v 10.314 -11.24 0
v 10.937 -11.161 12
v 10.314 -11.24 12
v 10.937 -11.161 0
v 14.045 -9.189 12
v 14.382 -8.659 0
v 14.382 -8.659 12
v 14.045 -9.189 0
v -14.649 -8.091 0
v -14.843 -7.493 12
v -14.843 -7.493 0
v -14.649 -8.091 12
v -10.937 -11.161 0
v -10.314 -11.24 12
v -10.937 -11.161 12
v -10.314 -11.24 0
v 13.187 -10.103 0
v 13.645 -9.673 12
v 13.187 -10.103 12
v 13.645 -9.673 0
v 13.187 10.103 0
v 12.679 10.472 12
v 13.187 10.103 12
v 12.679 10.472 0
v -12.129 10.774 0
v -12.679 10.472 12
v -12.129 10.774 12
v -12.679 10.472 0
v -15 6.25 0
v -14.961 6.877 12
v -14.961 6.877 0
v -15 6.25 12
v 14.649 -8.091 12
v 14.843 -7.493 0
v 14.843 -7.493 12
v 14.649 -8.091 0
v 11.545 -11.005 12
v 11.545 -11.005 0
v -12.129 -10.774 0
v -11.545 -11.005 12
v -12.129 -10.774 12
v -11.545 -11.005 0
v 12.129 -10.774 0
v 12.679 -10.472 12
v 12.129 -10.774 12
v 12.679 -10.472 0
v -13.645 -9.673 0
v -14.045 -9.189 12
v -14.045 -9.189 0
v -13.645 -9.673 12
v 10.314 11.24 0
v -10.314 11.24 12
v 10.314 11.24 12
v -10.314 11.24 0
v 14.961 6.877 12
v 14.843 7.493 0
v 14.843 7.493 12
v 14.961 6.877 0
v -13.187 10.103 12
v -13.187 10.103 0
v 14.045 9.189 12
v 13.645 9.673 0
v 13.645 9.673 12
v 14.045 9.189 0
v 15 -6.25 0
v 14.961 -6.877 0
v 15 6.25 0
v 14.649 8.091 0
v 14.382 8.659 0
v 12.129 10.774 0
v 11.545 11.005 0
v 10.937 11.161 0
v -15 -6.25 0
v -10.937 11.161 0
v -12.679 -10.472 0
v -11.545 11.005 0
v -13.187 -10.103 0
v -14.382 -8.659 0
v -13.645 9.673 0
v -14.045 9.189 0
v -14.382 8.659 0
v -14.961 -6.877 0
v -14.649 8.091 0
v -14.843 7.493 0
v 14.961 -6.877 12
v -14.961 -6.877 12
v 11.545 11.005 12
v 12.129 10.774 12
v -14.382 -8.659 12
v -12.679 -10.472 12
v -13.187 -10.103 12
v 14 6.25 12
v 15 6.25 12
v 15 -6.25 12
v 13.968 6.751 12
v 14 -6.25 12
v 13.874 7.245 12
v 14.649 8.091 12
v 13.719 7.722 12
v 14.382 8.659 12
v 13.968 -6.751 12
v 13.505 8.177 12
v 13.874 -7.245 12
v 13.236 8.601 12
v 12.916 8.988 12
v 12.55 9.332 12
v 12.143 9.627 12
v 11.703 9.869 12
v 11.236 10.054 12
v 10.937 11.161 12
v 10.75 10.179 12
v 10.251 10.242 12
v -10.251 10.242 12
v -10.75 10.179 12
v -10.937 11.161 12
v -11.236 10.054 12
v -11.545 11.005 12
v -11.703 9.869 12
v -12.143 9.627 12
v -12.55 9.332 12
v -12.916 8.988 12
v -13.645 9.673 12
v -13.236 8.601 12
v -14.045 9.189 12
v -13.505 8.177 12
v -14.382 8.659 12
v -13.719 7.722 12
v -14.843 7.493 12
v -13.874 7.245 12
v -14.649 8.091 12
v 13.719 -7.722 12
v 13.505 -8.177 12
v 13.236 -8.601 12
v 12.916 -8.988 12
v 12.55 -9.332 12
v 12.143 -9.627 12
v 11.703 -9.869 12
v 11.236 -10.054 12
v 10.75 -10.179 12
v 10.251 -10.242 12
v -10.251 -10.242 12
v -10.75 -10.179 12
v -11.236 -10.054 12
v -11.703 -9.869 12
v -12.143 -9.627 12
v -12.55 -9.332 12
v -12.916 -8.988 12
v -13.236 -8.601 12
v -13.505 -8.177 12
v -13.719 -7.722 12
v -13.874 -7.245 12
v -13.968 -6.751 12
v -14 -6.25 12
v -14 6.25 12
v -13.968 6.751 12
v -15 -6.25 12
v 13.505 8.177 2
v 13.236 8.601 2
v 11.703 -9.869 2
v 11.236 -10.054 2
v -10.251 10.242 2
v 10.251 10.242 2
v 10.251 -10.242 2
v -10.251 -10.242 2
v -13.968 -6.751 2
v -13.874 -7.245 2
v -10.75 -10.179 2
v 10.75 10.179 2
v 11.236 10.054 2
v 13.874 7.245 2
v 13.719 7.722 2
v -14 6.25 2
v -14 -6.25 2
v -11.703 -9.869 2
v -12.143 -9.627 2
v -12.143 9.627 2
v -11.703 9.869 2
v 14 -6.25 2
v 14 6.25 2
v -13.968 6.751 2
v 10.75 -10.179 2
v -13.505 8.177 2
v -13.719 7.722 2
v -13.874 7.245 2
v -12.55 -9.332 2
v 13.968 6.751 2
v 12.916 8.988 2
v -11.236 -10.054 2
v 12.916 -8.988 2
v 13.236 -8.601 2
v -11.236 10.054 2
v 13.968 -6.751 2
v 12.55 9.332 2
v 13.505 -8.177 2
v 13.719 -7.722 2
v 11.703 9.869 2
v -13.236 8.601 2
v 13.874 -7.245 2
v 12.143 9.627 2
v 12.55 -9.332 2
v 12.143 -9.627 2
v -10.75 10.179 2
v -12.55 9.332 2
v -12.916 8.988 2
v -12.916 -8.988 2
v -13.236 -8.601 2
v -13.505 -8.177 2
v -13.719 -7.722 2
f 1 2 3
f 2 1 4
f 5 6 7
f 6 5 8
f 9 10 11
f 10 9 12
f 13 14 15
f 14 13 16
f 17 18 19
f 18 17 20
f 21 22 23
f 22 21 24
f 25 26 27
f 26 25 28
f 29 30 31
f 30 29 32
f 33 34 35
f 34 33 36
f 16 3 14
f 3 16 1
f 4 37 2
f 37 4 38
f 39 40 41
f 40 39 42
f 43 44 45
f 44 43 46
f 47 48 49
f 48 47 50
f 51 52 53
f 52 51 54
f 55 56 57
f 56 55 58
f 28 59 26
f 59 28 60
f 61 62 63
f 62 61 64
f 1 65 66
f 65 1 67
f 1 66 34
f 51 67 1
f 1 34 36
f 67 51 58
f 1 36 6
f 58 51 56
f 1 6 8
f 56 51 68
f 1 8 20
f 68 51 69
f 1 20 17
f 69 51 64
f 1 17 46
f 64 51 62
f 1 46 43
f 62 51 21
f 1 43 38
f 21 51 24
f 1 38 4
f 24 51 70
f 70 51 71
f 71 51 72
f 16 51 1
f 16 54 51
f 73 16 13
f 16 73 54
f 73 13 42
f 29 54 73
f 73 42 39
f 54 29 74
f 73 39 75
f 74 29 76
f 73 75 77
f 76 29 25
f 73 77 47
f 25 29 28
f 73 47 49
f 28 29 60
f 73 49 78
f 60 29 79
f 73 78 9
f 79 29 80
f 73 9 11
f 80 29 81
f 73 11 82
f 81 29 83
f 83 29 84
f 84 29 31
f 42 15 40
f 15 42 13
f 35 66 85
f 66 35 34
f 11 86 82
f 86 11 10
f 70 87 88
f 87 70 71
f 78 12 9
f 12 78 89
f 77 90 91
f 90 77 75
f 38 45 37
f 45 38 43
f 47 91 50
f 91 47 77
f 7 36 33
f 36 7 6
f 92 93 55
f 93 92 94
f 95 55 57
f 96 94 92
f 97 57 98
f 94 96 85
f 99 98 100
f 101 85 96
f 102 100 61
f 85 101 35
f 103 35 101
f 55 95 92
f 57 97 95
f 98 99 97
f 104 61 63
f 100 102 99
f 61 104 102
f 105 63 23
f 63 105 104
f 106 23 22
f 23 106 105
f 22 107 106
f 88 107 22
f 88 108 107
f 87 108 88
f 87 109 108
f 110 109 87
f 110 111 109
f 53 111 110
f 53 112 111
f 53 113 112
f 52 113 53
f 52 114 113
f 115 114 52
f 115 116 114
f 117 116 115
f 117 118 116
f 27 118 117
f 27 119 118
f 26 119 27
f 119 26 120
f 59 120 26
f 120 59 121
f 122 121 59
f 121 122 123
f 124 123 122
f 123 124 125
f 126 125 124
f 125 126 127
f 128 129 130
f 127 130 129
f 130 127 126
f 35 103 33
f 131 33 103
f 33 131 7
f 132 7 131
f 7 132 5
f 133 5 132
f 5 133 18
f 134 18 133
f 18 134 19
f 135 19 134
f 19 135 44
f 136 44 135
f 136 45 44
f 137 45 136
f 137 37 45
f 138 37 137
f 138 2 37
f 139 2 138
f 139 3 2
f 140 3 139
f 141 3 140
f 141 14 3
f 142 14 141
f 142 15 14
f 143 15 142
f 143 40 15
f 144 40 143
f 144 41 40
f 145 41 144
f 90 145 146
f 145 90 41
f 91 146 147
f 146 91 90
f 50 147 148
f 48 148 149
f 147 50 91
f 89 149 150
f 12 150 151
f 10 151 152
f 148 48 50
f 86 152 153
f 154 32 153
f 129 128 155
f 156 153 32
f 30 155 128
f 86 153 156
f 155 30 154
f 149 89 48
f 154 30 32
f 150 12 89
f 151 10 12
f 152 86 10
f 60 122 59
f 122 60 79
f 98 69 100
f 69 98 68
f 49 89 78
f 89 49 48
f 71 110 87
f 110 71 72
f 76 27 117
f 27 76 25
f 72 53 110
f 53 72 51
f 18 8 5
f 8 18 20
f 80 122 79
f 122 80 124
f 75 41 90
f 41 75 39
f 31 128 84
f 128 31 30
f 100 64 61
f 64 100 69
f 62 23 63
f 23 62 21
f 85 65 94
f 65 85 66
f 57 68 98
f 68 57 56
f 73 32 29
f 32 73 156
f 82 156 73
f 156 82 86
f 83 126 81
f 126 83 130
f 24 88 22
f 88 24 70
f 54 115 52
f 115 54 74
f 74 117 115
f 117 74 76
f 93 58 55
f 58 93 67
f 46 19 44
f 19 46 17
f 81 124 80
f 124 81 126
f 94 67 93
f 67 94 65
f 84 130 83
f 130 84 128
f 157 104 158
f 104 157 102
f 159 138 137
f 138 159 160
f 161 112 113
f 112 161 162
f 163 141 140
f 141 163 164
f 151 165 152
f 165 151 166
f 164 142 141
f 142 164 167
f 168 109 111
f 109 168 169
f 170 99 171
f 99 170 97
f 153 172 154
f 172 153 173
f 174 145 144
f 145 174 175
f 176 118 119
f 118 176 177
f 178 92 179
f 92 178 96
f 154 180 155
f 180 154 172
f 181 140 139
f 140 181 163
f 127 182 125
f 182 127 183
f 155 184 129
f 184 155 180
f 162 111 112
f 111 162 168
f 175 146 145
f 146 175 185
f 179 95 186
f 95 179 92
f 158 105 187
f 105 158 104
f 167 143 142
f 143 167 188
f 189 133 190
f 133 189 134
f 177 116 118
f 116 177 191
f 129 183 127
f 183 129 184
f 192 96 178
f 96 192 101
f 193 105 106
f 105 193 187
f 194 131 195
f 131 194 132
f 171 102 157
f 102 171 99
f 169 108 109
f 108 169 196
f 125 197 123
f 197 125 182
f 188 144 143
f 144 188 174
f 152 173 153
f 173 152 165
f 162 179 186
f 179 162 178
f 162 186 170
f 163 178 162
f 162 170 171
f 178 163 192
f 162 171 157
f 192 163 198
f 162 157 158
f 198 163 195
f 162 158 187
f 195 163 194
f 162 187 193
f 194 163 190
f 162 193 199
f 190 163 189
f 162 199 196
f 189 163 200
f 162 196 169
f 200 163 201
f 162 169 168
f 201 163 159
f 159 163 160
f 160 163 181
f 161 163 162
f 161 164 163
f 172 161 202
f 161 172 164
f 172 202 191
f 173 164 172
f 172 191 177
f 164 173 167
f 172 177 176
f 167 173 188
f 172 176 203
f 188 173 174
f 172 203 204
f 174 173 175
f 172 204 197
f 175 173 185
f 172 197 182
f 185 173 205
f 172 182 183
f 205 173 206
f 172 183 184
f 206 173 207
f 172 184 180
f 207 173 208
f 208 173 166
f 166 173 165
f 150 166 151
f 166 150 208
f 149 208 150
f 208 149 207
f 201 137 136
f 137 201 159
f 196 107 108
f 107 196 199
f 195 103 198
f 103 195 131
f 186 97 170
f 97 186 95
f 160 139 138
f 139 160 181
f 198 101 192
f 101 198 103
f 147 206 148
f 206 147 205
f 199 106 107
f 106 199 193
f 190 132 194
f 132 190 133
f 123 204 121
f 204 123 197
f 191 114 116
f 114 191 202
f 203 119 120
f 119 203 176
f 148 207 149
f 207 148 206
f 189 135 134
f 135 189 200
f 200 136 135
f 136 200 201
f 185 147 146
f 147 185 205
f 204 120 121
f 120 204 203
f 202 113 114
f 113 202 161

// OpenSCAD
$fn = 50;


difference() {
	union() {
		hull() {
			translate(v = [-10.0000000000, 6.2500000000, 0]) {
				cylinder(h = 12, r = 5);
			}
			translate(v = [10.0000000000, 6.2500000000, 0]) {
				cylinder(h = 12, r = 5);
			}
			translate(v = [-10.0000000000, -6.2500000000, 0]) {
				cylinder(h = 12, r = 5);
			}
			translate(v = [10.0000000000, -6.2500000000, 0]) {
				cylinder(h = 12, r = 5);
			}
		}
	}
	union() {
		translate(v = [0, 0, 2]) {
			hull() {
				translate(v = [-10.0000000000, 6.2500000000, 0]) {
					cylinder(h = 10, r = 4);
				}
				translate(v = [10.0000000000, 6.2500000000, 0]) {
					cylinder(h = 10, r = 4);
				}
				translate(v = [-10.0000000000, -6.2500000000, 0]) {
					cylinder(h = 10, r = 4);
				}
				translate(v = [10.0000000000, -6.2500000000, 0]) {
					cylinder(h = 10, r = 4);
				}
			}
		}
	}
}
